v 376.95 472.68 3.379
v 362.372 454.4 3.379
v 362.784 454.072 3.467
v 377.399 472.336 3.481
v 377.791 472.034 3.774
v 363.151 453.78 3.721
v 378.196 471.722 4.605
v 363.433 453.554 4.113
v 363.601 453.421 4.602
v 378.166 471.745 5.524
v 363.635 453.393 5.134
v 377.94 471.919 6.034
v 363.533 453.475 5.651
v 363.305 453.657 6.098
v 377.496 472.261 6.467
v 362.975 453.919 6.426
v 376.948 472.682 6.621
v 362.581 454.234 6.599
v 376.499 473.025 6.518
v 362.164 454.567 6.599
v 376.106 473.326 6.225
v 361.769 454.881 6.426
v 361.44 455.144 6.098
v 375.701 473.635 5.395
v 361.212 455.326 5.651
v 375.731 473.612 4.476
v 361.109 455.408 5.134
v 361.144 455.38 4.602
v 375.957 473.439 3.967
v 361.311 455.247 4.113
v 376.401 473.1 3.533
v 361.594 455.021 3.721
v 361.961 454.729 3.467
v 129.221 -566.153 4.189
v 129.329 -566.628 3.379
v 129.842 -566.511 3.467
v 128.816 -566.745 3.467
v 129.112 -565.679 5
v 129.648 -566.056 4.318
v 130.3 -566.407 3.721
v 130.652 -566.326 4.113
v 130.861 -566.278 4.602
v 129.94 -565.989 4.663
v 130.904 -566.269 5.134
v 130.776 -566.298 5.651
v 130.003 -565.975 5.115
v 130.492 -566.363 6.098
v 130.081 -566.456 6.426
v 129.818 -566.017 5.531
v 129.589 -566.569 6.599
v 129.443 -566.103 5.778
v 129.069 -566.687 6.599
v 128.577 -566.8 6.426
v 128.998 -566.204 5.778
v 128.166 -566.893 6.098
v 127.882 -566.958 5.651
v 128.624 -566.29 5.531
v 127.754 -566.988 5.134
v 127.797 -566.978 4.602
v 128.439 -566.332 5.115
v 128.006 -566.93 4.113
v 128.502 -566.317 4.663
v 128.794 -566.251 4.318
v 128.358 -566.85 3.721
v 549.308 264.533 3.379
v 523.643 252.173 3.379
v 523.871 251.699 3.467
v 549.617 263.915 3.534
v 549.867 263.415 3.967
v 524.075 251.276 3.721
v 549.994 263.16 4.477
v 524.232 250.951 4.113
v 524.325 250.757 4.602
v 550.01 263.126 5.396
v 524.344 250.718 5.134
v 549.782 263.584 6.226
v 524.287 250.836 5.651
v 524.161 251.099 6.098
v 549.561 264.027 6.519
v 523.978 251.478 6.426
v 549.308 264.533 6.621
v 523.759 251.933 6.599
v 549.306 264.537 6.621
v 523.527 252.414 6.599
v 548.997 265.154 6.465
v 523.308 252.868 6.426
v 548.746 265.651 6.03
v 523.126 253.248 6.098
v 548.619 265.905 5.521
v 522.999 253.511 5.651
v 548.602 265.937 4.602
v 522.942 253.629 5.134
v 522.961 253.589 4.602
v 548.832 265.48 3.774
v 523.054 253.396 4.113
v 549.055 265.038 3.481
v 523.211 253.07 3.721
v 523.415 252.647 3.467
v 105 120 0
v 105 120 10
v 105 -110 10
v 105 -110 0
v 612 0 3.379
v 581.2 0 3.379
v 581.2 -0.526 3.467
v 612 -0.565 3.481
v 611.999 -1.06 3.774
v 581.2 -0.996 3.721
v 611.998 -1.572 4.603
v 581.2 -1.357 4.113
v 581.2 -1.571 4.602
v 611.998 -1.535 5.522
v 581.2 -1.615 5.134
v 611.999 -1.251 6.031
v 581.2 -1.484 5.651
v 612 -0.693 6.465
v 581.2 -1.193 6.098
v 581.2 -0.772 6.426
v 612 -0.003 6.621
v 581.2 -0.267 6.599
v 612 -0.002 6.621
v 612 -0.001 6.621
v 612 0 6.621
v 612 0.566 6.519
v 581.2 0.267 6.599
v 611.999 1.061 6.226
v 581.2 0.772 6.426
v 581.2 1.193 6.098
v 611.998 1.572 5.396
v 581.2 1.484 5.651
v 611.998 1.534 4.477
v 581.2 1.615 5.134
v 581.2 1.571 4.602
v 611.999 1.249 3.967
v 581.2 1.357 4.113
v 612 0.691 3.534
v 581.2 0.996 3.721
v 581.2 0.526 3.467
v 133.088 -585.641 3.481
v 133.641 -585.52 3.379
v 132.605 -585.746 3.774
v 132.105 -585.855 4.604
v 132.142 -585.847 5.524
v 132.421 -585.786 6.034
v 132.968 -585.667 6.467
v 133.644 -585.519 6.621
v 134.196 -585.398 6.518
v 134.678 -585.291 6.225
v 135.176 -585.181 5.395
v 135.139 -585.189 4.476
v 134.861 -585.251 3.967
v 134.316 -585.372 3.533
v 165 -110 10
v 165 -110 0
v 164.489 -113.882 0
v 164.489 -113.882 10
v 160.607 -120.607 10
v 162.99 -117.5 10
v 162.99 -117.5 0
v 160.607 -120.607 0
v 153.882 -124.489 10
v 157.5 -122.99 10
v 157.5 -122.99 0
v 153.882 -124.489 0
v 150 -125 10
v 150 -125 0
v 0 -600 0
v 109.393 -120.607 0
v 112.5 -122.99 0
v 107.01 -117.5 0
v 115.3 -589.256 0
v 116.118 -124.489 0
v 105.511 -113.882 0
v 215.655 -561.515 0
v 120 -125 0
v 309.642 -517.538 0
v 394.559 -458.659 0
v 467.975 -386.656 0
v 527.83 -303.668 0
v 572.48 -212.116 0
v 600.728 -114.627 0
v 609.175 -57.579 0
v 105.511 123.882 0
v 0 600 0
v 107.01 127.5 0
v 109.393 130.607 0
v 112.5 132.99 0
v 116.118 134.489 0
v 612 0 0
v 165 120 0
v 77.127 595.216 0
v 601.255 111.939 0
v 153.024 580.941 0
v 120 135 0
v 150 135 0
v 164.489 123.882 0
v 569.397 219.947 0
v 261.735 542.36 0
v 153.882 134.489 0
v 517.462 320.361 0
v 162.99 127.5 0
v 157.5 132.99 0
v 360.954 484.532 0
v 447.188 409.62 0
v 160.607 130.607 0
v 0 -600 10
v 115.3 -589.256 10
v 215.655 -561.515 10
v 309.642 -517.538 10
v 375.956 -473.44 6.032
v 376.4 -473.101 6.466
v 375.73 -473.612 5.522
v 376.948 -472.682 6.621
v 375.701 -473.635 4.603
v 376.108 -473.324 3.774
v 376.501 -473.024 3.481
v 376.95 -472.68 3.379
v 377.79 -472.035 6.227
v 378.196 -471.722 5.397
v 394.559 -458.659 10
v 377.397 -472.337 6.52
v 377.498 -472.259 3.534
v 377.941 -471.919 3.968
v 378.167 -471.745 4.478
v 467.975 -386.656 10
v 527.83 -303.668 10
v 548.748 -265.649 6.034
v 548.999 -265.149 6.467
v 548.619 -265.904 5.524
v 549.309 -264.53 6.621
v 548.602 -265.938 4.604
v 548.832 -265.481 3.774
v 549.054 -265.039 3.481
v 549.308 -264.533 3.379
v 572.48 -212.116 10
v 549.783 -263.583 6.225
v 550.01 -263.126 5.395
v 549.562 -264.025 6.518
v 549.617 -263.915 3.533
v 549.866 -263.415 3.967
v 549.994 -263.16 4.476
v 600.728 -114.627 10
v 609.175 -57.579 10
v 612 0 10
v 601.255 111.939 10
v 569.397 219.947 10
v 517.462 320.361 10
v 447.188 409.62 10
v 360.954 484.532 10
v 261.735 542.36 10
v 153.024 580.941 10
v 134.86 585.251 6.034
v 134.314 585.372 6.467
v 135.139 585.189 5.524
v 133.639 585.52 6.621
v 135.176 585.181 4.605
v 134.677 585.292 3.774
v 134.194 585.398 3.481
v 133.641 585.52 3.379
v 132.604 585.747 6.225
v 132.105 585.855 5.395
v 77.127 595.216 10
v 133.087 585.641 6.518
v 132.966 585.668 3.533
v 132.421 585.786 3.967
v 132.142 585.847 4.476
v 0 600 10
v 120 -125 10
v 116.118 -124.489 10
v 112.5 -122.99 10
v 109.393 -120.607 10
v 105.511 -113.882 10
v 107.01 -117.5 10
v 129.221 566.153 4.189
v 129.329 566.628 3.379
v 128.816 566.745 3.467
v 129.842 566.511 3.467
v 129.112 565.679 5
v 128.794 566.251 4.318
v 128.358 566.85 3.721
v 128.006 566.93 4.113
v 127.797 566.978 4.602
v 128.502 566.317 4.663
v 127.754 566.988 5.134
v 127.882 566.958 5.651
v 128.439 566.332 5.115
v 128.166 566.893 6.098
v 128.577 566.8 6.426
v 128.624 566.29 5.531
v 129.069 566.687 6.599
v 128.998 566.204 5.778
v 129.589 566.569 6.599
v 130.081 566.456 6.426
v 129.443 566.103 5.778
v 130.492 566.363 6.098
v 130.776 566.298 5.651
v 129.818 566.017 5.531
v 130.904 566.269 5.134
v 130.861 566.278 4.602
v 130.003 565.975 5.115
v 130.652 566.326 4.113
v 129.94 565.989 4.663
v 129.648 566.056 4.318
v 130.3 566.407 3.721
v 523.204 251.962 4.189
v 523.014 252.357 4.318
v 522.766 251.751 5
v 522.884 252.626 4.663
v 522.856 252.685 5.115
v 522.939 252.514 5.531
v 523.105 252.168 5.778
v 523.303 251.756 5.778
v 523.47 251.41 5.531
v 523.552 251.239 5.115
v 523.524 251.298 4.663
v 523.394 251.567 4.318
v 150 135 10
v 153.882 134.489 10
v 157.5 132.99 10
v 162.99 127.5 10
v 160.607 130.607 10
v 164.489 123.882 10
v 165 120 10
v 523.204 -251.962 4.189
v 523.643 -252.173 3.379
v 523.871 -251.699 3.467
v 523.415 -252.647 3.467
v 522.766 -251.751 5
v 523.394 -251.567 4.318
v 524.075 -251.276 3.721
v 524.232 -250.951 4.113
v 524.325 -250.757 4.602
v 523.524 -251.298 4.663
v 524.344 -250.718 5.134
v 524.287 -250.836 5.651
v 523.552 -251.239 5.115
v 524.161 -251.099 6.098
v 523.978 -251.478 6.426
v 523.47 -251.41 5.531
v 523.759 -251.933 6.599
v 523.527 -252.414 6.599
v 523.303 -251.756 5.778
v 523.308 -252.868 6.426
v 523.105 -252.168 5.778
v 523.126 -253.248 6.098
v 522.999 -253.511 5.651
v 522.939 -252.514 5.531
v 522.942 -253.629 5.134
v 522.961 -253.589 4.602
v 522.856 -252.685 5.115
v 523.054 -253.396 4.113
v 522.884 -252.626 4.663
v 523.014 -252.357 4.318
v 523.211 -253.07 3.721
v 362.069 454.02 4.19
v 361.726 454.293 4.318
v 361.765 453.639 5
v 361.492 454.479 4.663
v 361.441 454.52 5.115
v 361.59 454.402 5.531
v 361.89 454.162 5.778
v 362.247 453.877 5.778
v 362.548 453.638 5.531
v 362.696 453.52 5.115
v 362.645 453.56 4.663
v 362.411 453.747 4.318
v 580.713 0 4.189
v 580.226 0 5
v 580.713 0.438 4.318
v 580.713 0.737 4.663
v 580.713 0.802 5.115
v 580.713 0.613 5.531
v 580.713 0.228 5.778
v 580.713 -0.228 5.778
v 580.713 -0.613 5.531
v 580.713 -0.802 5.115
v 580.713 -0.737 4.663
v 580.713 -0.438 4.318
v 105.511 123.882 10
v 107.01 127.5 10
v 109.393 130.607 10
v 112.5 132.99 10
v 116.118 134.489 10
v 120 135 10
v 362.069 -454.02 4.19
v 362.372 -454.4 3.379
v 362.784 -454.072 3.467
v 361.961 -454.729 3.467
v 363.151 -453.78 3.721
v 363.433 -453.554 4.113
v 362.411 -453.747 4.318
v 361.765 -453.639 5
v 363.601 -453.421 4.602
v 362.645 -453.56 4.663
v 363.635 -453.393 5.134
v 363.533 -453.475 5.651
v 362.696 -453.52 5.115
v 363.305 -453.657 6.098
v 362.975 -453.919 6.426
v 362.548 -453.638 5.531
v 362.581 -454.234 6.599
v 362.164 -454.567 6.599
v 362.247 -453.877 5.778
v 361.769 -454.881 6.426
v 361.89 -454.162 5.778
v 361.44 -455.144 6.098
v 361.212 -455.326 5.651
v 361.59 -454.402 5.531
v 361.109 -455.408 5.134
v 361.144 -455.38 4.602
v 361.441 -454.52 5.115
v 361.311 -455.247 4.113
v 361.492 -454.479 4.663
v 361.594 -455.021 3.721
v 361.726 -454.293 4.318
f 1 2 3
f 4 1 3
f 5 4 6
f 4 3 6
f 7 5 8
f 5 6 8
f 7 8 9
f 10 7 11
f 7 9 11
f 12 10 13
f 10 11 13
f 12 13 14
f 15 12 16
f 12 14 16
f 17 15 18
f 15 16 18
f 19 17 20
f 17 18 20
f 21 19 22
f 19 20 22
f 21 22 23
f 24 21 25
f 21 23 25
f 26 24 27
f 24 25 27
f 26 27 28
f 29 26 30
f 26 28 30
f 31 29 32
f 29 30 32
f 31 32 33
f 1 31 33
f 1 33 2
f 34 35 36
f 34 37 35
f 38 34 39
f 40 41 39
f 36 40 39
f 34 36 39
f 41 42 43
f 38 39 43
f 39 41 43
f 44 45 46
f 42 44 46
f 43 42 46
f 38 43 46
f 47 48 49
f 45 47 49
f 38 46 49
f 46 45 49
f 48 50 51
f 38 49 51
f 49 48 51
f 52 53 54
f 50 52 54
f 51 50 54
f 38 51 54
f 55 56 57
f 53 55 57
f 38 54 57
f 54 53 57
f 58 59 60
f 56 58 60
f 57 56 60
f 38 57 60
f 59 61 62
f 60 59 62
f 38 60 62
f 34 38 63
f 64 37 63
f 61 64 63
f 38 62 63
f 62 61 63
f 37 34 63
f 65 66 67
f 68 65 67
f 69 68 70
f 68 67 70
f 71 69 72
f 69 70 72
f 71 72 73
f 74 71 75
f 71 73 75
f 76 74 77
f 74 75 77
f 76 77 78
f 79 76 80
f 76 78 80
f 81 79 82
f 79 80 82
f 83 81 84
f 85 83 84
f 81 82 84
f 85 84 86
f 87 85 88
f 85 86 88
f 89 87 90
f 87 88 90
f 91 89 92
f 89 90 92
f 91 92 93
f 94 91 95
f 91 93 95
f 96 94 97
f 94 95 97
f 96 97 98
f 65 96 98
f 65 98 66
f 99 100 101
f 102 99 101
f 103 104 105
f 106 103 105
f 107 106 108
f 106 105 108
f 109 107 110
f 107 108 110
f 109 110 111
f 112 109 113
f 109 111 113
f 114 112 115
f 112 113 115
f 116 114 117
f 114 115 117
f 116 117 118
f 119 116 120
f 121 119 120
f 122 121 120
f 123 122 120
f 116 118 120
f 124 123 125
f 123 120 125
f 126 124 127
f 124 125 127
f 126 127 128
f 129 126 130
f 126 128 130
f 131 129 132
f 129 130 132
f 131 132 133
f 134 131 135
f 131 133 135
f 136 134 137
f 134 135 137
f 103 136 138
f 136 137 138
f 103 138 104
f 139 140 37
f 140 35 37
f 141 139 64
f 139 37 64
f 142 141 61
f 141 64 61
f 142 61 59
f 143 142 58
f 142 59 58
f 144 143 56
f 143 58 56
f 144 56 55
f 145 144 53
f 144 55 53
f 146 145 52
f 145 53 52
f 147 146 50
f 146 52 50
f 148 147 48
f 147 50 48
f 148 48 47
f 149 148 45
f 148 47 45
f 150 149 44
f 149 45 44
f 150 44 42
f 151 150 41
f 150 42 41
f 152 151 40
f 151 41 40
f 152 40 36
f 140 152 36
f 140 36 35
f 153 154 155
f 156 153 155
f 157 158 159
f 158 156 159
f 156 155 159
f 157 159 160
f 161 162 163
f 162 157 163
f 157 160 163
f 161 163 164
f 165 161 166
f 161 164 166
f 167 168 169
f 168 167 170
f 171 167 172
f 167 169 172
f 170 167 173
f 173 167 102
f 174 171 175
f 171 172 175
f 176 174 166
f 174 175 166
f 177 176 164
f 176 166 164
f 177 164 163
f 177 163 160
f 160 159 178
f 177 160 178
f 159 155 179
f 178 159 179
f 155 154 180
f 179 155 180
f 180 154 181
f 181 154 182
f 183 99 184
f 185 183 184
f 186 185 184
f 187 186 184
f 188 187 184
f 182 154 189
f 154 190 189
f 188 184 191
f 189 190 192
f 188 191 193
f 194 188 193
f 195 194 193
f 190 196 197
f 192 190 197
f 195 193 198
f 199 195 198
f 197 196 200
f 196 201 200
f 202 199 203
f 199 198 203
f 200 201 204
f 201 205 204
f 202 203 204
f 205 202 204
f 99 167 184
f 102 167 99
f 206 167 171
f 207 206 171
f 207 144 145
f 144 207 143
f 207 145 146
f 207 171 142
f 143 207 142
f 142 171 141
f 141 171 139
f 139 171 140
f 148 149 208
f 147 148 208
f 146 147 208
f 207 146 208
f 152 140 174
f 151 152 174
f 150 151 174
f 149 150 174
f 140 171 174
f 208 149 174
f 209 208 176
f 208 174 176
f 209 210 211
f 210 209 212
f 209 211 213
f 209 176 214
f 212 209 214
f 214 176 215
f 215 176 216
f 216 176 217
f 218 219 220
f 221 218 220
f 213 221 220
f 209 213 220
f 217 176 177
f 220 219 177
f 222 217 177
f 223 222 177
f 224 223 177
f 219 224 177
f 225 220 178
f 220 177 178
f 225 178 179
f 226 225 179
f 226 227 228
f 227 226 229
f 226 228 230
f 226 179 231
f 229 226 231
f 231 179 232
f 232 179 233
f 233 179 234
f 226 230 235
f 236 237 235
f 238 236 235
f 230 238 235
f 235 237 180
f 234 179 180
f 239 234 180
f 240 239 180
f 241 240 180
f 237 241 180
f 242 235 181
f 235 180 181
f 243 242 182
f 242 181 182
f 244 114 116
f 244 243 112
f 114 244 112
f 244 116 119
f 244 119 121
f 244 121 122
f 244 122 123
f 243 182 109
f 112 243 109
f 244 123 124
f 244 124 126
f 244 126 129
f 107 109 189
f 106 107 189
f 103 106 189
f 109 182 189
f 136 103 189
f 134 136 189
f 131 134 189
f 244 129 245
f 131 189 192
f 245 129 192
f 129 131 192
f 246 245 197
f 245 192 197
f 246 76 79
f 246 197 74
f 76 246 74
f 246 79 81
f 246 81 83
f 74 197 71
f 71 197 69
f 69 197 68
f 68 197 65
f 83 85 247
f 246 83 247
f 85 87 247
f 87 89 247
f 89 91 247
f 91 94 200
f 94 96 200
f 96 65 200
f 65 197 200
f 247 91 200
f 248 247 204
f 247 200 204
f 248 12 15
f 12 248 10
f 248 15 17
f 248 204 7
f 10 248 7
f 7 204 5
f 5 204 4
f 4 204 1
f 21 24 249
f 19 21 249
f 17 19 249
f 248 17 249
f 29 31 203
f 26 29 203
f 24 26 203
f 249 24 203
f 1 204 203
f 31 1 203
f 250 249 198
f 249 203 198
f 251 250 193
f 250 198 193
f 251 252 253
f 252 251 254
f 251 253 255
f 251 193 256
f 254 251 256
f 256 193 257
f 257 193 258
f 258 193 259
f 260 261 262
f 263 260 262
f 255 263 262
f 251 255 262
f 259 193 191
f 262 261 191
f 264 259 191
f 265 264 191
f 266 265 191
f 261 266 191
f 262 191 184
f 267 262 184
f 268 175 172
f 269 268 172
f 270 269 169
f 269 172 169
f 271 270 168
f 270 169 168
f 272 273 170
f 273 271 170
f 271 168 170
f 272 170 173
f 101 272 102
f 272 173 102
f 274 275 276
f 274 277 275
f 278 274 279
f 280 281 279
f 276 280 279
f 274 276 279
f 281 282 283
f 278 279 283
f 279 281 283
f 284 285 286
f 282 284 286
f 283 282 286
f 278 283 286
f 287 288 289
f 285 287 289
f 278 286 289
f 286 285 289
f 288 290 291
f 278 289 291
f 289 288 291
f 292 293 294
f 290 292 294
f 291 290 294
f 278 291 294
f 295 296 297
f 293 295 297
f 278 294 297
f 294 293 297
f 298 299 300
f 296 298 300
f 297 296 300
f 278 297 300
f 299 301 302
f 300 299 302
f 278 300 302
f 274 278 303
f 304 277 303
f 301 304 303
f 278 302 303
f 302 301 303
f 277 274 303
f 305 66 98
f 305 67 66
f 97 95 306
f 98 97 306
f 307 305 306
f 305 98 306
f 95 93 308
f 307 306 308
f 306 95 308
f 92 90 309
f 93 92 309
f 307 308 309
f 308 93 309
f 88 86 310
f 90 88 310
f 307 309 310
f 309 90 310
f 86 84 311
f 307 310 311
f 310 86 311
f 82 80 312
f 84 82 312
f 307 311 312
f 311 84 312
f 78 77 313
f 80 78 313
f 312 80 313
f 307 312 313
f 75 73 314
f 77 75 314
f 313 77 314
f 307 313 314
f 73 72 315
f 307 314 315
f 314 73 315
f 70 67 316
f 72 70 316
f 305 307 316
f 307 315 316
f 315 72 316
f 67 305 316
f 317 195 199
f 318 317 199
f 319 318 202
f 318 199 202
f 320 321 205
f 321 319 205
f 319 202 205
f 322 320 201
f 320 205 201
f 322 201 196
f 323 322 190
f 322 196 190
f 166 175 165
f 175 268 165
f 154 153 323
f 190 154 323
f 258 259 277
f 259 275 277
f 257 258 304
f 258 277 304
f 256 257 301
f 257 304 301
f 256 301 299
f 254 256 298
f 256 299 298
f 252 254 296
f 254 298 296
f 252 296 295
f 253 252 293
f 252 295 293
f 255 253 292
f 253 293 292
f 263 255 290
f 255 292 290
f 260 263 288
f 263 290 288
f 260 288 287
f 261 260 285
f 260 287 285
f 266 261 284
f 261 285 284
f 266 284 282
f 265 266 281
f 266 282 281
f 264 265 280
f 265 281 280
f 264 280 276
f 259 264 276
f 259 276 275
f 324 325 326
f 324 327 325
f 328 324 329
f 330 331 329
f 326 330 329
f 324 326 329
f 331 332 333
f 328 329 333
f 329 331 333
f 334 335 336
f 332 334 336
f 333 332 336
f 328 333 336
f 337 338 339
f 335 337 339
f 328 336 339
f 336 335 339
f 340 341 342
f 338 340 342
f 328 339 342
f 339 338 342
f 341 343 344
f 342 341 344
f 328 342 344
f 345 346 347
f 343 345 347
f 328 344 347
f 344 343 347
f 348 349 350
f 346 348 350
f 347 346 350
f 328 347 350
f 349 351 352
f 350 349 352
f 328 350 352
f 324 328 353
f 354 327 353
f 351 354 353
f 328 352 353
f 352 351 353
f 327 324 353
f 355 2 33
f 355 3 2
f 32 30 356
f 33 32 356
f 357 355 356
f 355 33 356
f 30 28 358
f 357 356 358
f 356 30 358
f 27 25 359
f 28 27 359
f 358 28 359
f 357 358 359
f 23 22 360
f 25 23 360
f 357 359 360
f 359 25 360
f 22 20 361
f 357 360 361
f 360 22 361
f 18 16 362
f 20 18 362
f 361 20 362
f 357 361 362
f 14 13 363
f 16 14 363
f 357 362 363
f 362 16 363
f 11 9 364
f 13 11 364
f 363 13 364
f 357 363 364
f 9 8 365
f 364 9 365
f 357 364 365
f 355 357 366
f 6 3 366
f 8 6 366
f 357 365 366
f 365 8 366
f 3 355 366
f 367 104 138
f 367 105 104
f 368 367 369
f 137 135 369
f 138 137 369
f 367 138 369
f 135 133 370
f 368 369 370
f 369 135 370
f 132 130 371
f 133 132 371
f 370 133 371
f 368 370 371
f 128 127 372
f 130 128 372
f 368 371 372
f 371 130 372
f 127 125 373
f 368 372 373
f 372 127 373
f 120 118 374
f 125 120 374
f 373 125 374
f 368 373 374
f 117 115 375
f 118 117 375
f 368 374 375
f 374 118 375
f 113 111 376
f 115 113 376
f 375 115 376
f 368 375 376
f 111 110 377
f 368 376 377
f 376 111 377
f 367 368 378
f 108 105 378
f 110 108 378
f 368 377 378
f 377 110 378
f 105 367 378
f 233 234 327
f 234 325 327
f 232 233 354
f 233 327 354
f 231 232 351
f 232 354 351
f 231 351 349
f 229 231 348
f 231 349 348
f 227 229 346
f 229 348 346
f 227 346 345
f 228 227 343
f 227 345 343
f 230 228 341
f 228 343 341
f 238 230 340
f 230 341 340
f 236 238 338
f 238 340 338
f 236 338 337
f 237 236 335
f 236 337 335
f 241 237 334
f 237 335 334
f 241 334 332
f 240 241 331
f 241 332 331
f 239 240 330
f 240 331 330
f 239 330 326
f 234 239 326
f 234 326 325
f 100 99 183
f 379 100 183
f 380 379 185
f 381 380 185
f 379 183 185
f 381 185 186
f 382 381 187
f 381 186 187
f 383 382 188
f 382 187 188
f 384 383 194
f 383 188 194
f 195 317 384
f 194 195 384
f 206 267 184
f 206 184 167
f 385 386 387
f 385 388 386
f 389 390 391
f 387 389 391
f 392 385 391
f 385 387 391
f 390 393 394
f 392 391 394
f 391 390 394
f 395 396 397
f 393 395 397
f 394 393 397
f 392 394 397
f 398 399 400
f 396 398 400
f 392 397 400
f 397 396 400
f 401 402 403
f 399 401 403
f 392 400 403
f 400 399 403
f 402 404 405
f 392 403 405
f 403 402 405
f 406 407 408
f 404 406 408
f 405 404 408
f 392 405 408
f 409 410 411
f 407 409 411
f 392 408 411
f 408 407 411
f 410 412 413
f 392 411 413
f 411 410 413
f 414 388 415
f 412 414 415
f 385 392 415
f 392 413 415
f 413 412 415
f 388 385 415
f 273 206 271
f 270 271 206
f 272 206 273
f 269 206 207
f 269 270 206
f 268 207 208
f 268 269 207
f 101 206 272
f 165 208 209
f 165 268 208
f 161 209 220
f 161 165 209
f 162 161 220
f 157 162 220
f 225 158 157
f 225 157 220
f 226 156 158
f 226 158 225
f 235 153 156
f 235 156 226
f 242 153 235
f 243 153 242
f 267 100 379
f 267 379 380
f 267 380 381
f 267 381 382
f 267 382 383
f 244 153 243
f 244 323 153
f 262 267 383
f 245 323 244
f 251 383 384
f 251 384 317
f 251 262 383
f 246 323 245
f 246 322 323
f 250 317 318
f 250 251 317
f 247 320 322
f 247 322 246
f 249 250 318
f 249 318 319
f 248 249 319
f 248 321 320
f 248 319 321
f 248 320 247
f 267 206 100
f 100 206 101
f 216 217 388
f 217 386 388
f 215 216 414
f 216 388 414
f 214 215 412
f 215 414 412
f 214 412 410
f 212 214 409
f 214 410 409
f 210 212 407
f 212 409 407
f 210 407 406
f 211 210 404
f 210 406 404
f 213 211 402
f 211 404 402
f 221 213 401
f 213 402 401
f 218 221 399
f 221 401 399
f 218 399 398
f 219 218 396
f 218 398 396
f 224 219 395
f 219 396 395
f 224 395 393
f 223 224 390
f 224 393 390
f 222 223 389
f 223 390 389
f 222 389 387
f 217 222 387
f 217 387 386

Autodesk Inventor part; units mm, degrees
ref_plane "YZ Plane" through (0, 0, 0) normal (1, 0, 0) x (0, 1, 0)
ref_plane "XZ Plane" through (0, 0, 0) normal (0, 1, 0) x (-1, 0, 0)
sketch "Sketch1" plane through (0, 0, 0) normal (0, 0, 1) x (1, 0, 0)
  ellipse E0 centre (0, 0) end of major axis (612, 0) minor radius 600
  dimension "d0" = 612
  dimension "d1" = 600
extrude "Extrusion1" add sketch "Sketch1" along normal blind 10
sketch "Sketch2" plane through (0, 0, 10) normal (0, 0, 1) x (1, 0, 0)
  line L0 (-612, 600) -> (0, 600)
  line L1 (0, 600) -> (0, -600)
  line L2 (0, -600) -> (-612, -600)
  line L3 (-612, -600) -> (-612, 600)
  ellipse E0 centre (0, 0) end of major axis (-612, 0) minor radius 600 projected
extrude "Extrusion2" cut sketch "Sketch2" against normal through all contours L0 E0 L3 | L1 E0 | E0 L2 L3 picked at (-19.6985, 199.8178)
sketch "Sketch3" plane through (0, 0, 10) normal (0, 0, 1) x (1, 0, 0)
  line L0 (105, -125) -> (165, -125)
  line L1 (165, -125) -> (165, 135)
  line L2 (165, 135) -> (105, 135)
  line L3 (105, 135) -> (105, -125)
  line L4 (0, 600) -> (0, -600) projected
  point P0 (0, 0)
  dimension "d8" = 105
  dimension "d9" = 60
  dimension "d10" = 260
  dimension "d11" = 125
extrude "Extrusion3" cut sketch "Sketch3" against normal through all
fillet "Fillet1" radius 15 4 edges at (105, -125, 5) (165, -125, 5) (165, 135, 5) (105, 135, 5)
ref_plane "Work Plane1" through (612, -600, 10) normal (-1, 0, 0) x (0, 0, 1)
sketch "Sketch4" plane through (612, -600, 10) normal (-1, 0, 0) x (0, 0, 1)
  line L0 (0, 0) -> (0, 1200) projected
  line L1 (-12, 600) -> (2, 600) projected
  point P0 (-10, 600)
  point P1 (-5, 600)
  dimension "d16" = 5
hole "Hole1" at (612, 0, 5) direction (-1, 0, 0) diameter 3.242 depth 30.8 tip angle 118 thread size "M4x0.7" class "6H" standard "ANSI Metric M Profile"
pattern_circular "Circular Pattern1" count 14 over 360 about axis through (0, 0, -10) along (0, 0, 1) of "Hole1"
properties part number "Top_Guard 3" material "PMMA Plastic"
